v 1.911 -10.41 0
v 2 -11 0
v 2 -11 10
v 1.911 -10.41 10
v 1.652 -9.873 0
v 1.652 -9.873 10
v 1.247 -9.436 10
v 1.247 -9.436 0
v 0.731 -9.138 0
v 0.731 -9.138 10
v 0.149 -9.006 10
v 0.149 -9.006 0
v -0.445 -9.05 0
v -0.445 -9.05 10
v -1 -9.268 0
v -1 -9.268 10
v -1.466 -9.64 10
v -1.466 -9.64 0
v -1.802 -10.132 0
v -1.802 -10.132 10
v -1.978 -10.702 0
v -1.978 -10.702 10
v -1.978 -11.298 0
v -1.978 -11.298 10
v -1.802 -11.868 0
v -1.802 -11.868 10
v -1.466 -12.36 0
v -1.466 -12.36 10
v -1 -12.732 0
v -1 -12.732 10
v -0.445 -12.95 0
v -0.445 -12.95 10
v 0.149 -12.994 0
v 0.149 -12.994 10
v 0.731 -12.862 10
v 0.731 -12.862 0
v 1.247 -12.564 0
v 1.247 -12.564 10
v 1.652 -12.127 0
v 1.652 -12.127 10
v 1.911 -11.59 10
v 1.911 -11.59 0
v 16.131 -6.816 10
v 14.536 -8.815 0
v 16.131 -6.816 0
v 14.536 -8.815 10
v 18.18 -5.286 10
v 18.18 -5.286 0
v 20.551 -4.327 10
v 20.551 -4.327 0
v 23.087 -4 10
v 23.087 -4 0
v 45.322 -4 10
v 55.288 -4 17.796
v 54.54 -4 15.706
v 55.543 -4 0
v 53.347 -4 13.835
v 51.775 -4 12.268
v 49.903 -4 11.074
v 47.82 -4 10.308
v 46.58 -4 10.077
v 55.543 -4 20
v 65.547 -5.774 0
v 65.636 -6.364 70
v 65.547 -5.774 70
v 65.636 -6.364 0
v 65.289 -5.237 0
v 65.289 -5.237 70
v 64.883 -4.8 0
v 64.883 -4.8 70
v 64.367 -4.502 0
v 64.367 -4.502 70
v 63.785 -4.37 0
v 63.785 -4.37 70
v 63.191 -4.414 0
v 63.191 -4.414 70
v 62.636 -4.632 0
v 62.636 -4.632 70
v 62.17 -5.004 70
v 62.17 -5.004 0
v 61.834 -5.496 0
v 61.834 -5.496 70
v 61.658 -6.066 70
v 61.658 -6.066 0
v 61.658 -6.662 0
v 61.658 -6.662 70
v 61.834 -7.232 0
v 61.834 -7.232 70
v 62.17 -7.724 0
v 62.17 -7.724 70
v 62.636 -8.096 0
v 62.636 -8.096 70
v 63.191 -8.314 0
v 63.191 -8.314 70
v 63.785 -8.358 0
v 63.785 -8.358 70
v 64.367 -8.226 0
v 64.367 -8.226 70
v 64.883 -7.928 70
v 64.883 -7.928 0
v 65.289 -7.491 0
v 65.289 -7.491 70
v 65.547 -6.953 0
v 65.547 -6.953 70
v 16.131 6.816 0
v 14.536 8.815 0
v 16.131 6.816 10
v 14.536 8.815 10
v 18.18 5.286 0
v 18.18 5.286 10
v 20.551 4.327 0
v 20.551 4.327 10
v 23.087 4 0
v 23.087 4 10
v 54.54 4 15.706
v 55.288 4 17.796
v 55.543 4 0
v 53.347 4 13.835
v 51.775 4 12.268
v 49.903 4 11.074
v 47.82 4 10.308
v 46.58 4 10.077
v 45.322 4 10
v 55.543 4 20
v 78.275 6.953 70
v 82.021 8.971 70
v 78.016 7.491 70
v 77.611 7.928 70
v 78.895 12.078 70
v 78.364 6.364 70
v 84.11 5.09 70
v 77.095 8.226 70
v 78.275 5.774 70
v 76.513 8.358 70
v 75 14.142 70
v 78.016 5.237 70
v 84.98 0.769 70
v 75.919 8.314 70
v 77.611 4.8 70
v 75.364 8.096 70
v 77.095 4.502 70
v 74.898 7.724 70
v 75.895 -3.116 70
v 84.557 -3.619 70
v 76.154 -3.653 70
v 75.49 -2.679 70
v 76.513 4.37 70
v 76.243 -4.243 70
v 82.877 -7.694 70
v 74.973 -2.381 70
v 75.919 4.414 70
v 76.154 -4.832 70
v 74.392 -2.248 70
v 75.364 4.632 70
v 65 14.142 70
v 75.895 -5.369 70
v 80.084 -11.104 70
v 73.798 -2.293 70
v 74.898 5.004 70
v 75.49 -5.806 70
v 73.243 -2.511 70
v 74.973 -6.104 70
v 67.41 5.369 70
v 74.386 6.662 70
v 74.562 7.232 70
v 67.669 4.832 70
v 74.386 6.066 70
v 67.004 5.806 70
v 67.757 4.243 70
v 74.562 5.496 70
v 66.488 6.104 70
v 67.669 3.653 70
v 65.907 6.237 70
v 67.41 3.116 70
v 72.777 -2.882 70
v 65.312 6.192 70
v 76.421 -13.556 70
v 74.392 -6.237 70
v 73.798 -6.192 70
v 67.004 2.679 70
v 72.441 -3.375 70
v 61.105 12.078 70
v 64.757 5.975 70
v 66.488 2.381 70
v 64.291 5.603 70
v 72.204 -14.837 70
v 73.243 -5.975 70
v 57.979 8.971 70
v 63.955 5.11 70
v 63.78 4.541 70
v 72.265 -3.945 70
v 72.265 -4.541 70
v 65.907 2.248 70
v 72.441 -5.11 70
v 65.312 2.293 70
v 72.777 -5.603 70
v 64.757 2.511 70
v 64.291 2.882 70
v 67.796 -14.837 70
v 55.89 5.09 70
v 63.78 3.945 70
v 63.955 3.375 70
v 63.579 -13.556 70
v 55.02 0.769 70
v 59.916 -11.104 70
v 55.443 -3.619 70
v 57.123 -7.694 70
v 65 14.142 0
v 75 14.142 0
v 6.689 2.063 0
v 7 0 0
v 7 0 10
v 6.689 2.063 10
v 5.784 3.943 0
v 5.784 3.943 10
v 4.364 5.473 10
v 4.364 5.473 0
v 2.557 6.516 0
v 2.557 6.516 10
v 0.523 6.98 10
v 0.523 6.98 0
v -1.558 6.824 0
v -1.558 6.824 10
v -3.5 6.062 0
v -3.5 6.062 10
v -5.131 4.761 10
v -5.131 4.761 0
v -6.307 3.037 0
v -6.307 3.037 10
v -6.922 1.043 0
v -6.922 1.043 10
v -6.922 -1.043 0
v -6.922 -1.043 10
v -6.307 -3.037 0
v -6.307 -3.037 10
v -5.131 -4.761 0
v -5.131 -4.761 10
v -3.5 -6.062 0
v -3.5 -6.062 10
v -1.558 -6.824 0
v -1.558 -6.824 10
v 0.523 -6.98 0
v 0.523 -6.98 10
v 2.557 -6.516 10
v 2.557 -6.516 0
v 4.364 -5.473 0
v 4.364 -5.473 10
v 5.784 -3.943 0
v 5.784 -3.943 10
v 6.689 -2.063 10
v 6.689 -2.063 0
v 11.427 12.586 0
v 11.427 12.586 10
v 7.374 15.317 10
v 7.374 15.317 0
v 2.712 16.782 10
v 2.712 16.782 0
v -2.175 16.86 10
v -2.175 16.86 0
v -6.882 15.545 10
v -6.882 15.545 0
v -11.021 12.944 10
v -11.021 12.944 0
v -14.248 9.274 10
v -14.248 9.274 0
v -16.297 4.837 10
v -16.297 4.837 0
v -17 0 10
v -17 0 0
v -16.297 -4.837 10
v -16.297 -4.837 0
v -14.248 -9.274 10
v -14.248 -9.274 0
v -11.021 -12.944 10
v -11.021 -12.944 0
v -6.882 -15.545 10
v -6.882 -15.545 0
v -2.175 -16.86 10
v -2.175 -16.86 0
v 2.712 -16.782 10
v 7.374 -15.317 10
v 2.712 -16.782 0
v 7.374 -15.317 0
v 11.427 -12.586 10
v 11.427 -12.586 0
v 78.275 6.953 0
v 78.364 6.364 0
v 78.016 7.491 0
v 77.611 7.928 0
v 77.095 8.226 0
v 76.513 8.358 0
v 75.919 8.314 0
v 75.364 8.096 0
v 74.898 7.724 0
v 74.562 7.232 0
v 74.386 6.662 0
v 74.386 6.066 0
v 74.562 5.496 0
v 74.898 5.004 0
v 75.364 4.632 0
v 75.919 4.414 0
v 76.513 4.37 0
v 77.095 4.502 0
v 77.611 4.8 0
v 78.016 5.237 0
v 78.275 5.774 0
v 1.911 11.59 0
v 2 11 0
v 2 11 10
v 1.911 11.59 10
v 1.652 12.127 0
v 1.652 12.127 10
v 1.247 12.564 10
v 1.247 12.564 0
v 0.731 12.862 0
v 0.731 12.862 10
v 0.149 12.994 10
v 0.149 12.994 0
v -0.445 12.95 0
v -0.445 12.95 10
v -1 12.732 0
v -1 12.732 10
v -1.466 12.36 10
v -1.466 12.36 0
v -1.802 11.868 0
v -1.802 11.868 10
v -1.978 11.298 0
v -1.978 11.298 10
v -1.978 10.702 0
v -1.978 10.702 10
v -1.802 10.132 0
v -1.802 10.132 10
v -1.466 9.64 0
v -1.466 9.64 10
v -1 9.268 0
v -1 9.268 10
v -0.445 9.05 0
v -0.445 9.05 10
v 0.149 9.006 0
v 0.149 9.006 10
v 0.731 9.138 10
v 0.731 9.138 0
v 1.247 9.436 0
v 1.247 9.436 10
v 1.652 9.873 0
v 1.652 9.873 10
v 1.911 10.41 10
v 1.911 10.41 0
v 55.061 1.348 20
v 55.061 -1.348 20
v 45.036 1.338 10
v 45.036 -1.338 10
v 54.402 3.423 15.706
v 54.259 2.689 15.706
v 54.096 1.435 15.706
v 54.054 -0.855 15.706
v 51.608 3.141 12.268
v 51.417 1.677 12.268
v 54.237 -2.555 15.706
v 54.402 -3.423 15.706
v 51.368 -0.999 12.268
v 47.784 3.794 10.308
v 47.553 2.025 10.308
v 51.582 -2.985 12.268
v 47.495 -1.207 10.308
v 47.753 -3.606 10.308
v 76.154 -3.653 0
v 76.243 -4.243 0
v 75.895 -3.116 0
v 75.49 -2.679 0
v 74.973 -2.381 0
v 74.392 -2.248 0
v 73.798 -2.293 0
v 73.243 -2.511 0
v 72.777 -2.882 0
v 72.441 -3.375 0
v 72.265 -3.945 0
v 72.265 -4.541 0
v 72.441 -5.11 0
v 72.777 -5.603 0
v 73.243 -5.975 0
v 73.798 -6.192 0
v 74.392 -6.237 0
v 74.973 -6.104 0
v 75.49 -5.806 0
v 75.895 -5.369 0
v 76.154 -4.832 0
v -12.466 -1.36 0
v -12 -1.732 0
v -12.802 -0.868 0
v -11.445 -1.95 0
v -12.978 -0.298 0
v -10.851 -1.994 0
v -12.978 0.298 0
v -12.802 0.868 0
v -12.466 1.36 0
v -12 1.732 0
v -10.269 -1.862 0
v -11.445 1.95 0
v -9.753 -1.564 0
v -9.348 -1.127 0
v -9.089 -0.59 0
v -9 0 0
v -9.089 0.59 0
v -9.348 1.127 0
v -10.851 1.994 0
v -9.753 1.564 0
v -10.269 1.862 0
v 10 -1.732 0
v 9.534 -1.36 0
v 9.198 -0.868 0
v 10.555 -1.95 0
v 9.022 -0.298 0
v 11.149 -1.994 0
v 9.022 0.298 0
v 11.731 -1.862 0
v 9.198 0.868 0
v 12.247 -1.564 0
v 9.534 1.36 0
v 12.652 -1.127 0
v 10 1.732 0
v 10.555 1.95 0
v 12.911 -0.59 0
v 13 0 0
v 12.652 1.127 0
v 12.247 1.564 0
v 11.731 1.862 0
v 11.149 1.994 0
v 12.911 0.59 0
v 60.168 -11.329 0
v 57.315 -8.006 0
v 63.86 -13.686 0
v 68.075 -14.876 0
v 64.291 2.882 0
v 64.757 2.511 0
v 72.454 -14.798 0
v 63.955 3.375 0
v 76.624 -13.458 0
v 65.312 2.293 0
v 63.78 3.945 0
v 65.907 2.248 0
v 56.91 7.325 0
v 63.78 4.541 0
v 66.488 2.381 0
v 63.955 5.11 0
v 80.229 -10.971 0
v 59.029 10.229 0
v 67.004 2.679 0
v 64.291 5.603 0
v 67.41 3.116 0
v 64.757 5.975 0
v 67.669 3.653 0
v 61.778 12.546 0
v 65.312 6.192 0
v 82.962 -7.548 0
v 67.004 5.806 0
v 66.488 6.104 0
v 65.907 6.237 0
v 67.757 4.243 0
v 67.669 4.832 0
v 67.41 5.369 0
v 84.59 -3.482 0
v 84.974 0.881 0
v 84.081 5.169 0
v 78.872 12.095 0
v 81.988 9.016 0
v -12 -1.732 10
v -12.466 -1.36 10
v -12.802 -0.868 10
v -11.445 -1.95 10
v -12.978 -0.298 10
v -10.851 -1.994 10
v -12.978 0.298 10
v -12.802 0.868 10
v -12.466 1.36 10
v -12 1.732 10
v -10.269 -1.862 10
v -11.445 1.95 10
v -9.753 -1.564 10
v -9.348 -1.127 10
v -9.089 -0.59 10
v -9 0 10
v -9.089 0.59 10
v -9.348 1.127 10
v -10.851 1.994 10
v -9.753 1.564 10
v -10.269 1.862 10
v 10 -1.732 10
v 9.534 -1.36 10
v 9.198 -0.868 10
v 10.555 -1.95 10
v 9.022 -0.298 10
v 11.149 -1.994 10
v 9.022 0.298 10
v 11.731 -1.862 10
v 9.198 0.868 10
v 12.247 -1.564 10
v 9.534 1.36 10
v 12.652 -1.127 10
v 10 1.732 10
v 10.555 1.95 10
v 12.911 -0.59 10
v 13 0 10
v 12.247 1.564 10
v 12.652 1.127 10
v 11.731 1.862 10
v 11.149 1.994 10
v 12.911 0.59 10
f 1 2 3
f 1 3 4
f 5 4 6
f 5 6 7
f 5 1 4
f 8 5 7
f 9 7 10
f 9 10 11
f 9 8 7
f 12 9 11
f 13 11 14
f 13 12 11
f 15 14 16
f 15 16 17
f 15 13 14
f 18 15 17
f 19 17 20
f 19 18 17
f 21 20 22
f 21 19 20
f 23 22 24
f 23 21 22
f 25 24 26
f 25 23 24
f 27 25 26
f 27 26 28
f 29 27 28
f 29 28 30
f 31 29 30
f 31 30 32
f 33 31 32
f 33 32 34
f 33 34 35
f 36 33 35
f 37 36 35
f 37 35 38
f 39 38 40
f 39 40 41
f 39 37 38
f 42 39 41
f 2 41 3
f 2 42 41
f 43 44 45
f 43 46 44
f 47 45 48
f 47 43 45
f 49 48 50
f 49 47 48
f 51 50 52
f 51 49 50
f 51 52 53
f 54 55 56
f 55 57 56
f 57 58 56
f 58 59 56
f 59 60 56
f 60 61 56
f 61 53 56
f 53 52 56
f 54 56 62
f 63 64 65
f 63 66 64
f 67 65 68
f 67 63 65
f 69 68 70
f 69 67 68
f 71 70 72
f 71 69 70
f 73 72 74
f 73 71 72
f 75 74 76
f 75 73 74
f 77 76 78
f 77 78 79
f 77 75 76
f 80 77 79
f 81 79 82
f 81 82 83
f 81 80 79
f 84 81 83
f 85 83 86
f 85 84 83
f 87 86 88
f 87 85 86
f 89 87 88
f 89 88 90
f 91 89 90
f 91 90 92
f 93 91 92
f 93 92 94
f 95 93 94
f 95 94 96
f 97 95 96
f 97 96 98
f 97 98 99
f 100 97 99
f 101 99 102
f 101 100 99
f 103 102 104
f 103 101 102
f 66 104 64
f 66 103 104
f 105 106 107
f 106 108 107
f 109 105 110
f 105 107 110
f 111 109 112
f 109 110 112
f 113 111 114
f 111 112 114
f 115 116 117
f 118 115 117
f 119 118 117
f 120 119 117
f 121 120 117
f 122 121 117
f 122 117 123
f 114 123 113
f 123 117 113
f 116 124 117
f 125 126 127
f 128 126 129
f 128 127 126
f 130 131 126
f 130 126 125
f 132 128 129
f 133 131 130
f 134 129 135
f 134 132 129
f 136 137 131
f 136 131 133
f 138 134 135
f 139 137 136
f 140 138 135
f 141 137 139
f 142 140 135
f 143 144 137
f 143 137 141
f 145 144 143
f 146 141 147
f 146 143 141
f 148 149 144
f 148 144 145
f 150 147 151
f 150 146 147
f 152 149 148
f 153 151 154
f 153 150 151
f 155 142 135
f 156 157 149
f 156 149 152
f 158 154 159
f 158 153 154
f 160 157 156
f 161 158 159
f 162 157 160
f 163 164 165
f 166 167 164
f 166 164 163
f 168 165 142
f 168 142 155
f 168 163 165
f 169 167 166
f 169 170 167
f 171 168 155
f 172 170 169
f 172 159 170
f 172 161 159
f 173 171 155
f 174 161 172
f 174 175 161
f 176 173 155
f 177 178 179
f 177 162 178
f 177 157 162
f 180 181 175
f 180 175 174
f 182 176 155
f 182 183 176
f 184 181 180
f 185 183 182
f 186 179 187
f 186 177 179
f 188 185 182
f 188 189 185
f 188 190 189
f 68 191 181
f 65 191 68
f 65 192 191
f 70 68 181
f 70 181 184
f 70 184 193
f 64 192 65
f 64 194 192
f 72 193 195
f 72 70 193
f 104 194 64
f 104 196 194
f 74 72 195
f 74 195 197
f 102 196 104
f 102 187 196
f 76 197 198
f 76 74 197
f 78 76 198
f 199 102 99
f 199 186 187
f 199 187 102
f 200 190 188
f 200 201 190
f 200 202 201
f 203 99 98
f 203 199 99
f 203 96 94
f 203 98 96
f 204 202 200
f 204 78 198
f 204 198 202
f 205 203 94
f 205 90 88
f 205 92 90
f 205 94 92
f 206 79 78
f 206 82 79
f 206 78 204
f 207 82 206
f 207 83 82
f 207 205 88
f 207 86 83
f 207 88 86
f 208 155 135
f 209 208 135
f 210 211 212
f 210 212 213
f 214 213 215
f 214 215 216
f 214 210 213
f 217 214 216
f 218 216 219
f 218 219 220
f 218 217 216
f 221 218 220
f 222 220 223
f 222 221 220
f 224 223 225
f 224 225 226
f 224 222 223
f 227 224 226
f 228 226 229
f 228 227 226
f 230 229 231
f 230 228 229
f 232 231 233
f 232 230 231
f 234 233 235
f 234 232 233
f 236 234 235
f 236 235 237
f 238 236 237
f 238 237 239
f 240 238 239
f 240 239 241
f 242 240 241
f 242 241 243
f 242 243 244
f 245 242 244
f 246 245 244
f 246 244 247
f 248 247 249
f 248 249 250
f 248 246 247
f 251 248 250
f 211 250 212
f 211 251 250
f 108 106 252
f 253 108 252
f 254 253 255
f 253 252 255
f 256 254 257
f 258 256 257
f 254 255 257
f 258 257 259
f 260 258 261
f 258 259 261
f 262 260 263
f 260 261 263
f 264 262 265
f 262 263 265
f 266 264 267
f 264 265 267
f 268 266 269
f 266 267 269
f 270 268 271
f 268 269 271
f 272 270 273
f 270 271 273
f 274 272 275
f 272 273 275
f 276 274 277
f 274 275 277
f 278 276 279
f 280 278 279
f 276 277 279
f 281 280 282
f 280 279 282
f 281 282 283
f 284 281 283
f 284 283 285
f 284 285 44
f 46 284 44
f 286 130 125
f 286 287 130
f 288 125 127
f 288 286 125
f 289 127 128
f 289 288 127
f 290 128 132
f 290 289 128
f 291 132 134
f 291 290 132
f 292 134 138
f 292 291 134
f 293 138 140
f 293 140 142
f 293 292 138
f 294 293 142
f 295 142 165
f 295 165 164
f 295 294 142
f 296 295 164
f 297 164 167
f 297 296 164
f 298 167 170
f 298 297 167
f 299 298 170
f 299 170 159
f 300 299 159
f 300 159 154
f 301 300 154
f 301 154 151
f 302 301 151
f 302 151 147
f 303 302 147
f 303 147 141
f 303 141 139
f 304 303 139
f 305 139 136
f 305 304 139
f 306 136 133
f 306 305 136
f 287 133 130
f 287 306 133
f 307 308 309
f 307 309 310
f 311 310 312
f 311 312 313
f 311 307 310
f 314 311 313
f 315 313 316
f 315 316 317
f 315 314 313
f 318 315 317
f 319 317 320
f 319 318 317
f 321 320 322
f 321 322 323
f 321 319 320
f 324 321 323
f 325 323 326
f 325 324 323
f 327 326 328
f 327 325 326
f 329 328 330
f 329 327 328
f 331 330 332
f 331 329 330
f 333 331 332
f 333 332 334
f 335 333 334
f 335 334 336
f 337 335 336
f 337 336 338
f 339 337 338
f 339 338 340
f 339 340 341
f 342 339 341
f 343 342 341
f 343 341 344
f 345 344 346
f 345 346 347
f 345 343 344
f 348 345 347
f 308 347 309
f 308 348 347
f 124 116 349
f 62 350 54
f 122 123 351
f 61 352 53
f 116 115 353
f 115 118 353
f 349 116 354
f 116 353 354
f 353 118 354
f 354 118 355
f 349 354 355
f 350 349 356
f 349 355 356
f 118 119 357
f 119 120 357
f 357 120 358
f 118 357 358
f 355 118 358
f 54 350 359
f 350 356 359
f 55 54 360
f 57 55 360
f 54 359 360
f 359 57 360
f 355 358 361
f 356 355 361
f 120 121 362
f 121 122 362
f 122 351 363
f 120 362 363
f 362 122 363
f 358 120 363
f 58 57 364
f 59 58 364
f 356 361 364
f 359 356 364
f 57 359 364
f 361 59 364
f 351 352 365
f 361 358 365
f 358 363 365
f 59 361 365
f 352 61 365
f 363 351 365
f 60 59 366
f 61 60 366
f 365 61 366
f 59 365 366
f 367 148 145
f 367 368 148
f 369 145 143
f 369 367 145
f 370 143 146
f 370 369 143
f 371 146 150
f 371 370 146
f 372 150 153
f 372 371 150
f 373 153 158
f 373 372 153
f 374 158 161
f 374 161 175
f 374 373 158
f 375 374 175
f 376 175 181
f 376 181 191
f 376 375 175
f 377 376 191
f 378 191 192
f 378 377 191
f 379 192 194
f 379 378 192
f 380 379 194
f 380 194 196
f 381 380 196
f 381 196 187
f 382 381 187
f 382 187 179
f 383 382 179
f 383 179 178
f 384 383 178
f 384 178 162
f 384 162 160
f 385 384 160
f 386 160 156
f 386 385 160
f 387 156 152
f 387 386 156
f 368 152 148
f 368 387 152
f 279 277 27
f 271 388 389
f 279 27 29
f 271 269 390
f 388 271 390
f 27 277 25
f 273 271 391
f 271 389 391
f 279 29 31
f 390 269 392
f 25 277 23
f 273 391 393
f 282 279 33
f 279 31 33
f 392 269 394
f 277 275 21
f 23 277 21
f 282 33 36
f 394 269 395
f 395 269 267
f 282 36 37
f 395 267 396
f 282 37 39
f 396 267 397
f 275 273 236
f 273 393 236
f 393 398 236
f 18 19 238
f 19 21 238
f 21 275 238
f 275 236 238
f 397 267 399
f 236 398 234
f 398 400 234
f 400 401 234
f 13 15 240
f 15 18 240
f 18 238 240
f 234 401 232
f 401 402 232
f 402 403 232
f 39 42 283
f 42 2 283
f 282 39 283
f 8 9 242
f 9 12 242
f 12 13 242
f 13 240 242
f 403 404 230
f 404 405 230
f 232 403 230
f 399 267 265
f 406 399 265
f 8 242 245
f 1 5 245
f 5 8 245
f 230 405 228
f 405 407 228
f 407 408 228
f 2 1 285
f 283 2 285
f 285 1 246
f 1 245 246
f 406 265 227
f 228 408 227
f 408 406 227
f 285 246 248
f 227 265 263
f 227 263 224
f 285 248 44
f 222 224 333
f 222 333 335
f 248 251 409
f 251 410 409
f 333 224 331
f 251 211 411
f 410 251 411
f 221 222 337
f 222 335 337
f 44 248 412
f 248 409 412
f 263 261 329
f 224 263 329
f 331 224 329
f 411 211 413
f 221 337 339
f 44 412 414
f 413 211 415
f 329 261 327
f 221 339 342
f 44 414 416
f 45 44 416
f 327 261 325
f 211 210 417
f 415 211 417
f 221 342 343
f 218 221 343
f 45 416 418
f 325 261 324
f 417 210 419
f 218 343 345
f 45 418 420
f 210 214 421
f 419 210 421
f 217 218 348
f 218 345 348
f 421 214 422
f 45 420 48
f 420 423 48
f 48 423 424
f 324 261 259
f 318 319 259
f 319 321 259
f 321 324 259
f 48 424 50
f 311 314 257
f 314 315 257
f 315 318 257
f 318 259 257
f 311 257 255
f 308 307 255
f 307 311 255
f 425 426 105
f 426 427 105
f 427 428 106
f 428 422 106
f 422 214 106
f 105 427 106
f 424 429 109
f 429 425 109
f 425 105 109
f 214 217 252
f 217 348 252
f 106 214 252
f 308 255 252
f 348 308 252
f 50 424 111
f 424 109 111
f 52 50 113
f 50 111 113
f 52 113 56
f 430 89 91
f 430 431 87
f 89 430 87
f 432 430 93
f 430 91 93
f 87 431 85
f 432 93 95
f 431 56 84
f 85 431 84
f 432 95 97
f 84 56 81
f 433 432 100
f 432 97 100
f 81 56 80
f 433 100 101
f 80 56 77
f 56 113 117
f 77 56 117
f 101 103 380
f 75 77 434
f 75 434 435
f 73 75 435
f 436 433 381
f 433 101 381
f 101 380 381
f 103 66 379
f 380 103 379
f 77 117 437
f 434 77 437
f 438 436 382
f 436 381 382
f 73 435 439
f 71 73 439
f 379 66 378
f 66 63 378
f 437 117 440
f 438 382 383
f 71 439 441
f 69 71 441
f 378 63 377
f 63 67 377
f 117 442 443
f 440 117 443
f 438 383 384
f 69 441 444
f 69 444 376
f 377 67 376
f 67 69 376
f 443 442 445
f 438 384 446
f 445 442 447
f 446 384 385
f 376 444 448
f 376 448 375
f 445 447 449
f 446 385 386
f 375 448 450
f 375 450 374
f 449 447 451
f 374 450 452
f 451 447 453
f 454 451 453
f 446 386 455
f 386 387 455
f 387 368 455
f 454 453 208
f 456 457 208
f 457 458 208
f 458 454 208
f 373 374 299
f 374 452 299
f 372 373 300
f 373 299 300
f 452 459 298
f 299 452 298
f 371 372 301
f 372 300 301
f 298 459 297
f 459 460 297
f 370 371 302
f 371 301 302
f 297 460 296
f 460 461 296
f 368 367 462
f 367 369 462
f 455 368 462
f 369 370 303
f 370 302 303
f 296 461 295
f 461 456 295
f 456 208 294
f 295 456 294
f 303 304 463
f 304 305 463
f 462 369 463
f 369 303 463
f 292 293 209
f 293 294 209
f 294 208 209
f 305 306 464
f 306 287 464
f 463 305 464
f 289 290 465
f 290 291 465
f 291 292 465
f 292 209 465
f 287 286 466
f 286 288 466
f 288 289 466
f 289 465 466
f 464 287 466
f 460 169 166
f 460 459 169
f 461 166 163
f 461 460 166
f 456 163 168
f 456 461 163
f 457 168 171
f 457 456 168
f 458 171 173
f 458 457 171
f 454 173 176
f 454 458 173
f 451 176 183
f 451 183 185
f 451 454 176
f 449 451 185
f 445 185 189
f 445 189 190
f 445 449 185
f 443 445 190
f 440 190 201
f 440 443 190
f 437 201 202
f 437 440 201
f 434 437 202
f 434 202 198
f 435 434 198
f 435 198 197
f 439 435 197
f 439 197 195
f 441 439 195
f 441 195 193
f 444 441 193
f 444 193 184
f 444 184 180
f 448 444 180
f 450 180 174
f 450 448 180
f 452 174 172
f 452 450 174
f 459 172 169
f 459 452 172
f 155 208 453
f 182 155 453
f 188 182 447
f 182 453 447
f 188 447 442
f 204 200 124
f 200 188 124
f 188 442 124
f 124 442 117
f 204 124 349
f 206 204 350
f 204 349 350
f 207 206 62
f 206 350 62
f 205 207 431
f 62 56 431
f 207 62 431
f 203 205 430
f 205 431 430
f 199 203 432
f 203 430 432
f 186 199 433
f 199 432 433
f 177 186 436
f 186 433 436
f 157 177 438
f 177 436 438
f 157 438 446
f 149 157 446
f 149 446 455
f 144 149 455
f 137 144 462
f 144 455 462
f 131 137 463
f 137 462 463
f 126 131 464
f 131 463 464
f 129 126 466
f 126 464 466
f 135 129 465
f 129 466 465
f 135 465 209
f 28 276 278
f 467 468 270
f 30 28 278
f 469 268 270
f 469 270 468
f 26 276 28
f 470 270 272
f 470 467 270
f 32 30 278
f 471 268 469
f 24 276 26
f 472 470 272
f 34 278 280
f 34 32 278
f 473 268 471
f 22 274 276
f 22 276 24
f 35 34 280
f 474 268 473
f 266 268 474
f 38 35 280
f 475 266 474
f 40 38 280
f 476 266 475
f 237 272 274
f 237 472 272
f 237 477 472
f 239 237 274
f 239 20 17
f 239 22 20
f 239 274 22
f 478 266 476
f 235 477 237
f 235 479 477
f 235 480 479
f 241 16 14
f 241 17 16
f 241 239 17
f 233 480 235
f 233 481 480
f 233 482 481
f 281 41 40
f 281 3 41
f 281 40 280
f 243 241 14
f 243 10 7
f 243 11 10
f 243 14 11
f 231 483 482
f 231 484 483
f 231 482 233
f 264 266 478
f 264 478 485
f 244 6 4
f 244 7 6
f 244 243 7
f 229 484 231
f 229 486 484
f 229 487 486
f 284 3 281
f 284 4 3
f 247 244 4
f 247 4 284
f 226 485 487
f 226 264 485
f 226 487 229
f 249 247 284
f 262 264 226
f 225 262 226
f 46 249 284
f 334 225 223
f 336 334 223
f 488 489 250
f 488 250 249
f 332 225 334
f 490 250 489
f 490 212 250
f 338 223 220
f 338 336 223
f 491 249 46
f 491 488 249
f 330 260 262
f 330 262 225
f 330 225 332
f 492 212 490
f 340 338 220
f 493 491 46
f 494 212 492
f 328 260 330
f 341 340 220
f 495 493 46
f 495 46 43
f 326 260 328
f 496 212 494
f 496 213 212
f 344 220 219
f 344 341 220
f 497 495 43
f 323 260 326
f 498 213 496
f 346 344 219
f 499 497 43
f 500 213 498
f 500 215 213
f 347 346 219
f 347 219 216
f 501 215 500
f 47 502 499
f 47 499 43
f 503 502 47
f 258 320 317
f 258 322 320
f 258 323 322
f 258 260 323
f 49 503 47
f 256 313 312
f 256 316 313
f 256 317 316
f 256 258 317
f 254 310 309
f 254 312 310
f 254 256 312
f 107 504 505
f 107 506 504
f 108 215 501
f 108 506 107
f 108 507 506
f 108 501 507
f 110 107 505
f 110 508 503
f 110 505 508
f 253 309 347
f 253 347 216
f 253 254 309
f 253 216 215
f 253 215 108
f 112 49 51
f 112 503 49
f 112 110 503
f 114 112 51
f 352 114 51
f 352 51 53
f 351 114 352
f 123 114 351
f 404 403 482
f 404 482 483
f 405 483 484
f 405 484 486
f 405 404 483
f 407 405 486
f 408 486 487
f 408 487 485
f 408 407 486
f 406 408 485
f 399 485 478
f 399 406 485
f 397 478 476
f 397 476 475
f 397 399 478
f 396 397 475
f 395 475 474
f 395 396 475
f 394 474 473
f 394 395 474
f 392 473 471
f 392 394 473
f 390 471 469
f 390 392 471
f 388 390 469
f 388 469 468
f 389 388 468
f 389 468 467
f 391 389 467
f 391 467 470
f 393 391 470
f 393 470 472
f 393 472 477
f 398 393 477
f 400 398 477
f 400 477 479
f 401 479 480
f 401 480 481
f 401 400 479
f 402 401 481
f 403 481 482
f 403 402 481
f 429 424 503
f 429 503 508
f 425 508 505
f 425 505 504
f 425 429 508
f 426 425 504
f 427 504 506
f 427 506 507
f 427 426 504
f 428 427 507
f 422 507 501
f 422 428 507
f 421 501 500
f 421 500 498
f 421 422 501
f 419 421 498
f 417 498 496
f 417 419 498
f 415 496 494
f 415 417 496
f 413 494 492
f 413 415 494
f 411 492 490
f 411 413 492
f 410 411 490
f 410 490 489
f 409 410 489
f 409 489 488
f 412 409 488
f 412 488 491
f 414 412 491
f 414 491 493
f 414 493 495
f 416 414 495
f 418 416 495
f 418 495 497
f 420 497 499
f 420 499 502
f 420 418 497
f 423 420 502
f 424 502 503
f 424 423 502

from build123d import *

# Parameters (mm, degrees)
SKETCH1_R           = 1.9999999999999996
SKETCH1_R_2         = 2
SKETCH1_R_3         = 7
SKETCH1_R_4         = 1.9999999999999967
BOSS_EXTRUDE1_DEPTH = 10
SKETCH2_R           = 15.000000000000057
SKETCH2_R_2         = 1.9999999999999967
BOSS_EXTRUDE2_DEPTH = 60
CUT_EXTRUDE1_DEPTH  = 112.41813137905342
FILLET1_R           = 10
FILLET2_R           = 10


with BuildPart() as part:
    # Sketch1 → Boss-Extrude1 (new body)
    with BuildSketch(Plane.XY):
        with BuildLine():
            Line((55.54316770519905, 4), (16.522711641858304, 4))
            ThreePointArc((16.522711641858304, 4), (-17, -5.47e-15), (16.522711641858304, -3.9999999999999996))
            Line((16.522711641858304, -4), (55.54316770519905, -4))
            ThreePointArc((55.54316770519898, -4.000000000000017), (85.00000000000006, 0), (55.54316770519898, 4.0000000000000195))
        make_face()
        with Locations((11, 1.73e-15)):
            Circle(SKETCH1_R, mode=Mode.SUBTRACT)
        with Locations((0, 11)):
            Circle(SKETCH1_R_2, mode=Mode.SUBTRACT)
        with Locations((8.7e-16, -11)):
            Circle(SKETCH1_R_2, mode=Mode.SUBTRACT)
        with Locations((-11, -2.6e-15)):
            Circle(SKETCH1_R, mode=Mode.SUBTRACT)
        Circle(SKETCH1_R_3, mode=Mode.SUBTRACT)
        with Locations((76.36396103067892, 6.363961030678928)):
            Circle(SKETCH1_R_4, mode=Mode.SUBTRACT)
        with Locations((63.636038969321085, -6.363961030678926)):
            Circle(SKETCH1_R_4, mode=Mode.SUBTRACT)
        with Locations((74.24264068711929, -4.242640687119276)):
            Circle(SKETCH1_R_4, mode=Mode.SUBTRACT)
        with Locations((65.75735931288074, 4.242640687119292)):
            Circle(SKETCH1_R_4, mode=Mode.SUBTRACT)
    extrude(amount=BOSS_EXTRUDE1_DEPTH)

    # Sketch2 → Boss-Extrude2 (add)
    with BuildSketch(Plane.XY.offset(10)):
        with Locations(Location((70, 0, 0), (0, 0, 164.533990047))):
            Circle(SKETCH2_R)
        with Locations((63.636038969321085, -6.363961030678926)):
            Circle(SKETCH2_R_2, mode=Mode.SUBTRACT)
        with Locations((74.24264068711929, -4.242640687119276)):
            Circle(SKETCH2_R_2, mode=Mode.SUBTRACT)
        with Locations((76.36396103067892, 6.363961030678928)):
            Circle(SKETCH2_R_2, mode=Mode.SUBTRACT)
        with Locations((65.75735931288074, 4.242640687119292)):
            Circle(SKETCH2_R_2, mode=Mode.SUBTRACT)
    extrude(amount=BOSS_EXTRUDE2_DEPTH)

    # Sketch3 → Cut-Extrude1 (cut, through all)
    with BuildSketch(Plane.XY.offset(69.99999999999999)):
        with BuildLine():
            ThreePointArc((74.99999999999999, 14.142135623731015), (70, 15.000000000000057), (65, 14.142135623731011))
            Line((65, 14.142135623731008), (74.99999999999999, 14.142135623731008))
        make_face()
    extrude(amount=-CUT_EXTRUDE1_DEPTH, mode=Mode.SUBTRACT)

    # Fillet1
    fillet1_edges = [part.edges().sort_by_distance(p)[0] for p in [
        (54.99999999999994, -5.50493e-11, 10),
    ]]
    fillet(fillet1_edges, radius=FILLET1_R)

    # Fillet2
    fillet2_edges = [part.edges().sort_by_distance(p)[0] for p in [
        (16.522711641858304, 4, 5),
        (16.522711641858308, -4.000000000000004, 5),
    ]]
    fillet(fillet2_edges, radius=FILLET2_R)


solid = part.part
